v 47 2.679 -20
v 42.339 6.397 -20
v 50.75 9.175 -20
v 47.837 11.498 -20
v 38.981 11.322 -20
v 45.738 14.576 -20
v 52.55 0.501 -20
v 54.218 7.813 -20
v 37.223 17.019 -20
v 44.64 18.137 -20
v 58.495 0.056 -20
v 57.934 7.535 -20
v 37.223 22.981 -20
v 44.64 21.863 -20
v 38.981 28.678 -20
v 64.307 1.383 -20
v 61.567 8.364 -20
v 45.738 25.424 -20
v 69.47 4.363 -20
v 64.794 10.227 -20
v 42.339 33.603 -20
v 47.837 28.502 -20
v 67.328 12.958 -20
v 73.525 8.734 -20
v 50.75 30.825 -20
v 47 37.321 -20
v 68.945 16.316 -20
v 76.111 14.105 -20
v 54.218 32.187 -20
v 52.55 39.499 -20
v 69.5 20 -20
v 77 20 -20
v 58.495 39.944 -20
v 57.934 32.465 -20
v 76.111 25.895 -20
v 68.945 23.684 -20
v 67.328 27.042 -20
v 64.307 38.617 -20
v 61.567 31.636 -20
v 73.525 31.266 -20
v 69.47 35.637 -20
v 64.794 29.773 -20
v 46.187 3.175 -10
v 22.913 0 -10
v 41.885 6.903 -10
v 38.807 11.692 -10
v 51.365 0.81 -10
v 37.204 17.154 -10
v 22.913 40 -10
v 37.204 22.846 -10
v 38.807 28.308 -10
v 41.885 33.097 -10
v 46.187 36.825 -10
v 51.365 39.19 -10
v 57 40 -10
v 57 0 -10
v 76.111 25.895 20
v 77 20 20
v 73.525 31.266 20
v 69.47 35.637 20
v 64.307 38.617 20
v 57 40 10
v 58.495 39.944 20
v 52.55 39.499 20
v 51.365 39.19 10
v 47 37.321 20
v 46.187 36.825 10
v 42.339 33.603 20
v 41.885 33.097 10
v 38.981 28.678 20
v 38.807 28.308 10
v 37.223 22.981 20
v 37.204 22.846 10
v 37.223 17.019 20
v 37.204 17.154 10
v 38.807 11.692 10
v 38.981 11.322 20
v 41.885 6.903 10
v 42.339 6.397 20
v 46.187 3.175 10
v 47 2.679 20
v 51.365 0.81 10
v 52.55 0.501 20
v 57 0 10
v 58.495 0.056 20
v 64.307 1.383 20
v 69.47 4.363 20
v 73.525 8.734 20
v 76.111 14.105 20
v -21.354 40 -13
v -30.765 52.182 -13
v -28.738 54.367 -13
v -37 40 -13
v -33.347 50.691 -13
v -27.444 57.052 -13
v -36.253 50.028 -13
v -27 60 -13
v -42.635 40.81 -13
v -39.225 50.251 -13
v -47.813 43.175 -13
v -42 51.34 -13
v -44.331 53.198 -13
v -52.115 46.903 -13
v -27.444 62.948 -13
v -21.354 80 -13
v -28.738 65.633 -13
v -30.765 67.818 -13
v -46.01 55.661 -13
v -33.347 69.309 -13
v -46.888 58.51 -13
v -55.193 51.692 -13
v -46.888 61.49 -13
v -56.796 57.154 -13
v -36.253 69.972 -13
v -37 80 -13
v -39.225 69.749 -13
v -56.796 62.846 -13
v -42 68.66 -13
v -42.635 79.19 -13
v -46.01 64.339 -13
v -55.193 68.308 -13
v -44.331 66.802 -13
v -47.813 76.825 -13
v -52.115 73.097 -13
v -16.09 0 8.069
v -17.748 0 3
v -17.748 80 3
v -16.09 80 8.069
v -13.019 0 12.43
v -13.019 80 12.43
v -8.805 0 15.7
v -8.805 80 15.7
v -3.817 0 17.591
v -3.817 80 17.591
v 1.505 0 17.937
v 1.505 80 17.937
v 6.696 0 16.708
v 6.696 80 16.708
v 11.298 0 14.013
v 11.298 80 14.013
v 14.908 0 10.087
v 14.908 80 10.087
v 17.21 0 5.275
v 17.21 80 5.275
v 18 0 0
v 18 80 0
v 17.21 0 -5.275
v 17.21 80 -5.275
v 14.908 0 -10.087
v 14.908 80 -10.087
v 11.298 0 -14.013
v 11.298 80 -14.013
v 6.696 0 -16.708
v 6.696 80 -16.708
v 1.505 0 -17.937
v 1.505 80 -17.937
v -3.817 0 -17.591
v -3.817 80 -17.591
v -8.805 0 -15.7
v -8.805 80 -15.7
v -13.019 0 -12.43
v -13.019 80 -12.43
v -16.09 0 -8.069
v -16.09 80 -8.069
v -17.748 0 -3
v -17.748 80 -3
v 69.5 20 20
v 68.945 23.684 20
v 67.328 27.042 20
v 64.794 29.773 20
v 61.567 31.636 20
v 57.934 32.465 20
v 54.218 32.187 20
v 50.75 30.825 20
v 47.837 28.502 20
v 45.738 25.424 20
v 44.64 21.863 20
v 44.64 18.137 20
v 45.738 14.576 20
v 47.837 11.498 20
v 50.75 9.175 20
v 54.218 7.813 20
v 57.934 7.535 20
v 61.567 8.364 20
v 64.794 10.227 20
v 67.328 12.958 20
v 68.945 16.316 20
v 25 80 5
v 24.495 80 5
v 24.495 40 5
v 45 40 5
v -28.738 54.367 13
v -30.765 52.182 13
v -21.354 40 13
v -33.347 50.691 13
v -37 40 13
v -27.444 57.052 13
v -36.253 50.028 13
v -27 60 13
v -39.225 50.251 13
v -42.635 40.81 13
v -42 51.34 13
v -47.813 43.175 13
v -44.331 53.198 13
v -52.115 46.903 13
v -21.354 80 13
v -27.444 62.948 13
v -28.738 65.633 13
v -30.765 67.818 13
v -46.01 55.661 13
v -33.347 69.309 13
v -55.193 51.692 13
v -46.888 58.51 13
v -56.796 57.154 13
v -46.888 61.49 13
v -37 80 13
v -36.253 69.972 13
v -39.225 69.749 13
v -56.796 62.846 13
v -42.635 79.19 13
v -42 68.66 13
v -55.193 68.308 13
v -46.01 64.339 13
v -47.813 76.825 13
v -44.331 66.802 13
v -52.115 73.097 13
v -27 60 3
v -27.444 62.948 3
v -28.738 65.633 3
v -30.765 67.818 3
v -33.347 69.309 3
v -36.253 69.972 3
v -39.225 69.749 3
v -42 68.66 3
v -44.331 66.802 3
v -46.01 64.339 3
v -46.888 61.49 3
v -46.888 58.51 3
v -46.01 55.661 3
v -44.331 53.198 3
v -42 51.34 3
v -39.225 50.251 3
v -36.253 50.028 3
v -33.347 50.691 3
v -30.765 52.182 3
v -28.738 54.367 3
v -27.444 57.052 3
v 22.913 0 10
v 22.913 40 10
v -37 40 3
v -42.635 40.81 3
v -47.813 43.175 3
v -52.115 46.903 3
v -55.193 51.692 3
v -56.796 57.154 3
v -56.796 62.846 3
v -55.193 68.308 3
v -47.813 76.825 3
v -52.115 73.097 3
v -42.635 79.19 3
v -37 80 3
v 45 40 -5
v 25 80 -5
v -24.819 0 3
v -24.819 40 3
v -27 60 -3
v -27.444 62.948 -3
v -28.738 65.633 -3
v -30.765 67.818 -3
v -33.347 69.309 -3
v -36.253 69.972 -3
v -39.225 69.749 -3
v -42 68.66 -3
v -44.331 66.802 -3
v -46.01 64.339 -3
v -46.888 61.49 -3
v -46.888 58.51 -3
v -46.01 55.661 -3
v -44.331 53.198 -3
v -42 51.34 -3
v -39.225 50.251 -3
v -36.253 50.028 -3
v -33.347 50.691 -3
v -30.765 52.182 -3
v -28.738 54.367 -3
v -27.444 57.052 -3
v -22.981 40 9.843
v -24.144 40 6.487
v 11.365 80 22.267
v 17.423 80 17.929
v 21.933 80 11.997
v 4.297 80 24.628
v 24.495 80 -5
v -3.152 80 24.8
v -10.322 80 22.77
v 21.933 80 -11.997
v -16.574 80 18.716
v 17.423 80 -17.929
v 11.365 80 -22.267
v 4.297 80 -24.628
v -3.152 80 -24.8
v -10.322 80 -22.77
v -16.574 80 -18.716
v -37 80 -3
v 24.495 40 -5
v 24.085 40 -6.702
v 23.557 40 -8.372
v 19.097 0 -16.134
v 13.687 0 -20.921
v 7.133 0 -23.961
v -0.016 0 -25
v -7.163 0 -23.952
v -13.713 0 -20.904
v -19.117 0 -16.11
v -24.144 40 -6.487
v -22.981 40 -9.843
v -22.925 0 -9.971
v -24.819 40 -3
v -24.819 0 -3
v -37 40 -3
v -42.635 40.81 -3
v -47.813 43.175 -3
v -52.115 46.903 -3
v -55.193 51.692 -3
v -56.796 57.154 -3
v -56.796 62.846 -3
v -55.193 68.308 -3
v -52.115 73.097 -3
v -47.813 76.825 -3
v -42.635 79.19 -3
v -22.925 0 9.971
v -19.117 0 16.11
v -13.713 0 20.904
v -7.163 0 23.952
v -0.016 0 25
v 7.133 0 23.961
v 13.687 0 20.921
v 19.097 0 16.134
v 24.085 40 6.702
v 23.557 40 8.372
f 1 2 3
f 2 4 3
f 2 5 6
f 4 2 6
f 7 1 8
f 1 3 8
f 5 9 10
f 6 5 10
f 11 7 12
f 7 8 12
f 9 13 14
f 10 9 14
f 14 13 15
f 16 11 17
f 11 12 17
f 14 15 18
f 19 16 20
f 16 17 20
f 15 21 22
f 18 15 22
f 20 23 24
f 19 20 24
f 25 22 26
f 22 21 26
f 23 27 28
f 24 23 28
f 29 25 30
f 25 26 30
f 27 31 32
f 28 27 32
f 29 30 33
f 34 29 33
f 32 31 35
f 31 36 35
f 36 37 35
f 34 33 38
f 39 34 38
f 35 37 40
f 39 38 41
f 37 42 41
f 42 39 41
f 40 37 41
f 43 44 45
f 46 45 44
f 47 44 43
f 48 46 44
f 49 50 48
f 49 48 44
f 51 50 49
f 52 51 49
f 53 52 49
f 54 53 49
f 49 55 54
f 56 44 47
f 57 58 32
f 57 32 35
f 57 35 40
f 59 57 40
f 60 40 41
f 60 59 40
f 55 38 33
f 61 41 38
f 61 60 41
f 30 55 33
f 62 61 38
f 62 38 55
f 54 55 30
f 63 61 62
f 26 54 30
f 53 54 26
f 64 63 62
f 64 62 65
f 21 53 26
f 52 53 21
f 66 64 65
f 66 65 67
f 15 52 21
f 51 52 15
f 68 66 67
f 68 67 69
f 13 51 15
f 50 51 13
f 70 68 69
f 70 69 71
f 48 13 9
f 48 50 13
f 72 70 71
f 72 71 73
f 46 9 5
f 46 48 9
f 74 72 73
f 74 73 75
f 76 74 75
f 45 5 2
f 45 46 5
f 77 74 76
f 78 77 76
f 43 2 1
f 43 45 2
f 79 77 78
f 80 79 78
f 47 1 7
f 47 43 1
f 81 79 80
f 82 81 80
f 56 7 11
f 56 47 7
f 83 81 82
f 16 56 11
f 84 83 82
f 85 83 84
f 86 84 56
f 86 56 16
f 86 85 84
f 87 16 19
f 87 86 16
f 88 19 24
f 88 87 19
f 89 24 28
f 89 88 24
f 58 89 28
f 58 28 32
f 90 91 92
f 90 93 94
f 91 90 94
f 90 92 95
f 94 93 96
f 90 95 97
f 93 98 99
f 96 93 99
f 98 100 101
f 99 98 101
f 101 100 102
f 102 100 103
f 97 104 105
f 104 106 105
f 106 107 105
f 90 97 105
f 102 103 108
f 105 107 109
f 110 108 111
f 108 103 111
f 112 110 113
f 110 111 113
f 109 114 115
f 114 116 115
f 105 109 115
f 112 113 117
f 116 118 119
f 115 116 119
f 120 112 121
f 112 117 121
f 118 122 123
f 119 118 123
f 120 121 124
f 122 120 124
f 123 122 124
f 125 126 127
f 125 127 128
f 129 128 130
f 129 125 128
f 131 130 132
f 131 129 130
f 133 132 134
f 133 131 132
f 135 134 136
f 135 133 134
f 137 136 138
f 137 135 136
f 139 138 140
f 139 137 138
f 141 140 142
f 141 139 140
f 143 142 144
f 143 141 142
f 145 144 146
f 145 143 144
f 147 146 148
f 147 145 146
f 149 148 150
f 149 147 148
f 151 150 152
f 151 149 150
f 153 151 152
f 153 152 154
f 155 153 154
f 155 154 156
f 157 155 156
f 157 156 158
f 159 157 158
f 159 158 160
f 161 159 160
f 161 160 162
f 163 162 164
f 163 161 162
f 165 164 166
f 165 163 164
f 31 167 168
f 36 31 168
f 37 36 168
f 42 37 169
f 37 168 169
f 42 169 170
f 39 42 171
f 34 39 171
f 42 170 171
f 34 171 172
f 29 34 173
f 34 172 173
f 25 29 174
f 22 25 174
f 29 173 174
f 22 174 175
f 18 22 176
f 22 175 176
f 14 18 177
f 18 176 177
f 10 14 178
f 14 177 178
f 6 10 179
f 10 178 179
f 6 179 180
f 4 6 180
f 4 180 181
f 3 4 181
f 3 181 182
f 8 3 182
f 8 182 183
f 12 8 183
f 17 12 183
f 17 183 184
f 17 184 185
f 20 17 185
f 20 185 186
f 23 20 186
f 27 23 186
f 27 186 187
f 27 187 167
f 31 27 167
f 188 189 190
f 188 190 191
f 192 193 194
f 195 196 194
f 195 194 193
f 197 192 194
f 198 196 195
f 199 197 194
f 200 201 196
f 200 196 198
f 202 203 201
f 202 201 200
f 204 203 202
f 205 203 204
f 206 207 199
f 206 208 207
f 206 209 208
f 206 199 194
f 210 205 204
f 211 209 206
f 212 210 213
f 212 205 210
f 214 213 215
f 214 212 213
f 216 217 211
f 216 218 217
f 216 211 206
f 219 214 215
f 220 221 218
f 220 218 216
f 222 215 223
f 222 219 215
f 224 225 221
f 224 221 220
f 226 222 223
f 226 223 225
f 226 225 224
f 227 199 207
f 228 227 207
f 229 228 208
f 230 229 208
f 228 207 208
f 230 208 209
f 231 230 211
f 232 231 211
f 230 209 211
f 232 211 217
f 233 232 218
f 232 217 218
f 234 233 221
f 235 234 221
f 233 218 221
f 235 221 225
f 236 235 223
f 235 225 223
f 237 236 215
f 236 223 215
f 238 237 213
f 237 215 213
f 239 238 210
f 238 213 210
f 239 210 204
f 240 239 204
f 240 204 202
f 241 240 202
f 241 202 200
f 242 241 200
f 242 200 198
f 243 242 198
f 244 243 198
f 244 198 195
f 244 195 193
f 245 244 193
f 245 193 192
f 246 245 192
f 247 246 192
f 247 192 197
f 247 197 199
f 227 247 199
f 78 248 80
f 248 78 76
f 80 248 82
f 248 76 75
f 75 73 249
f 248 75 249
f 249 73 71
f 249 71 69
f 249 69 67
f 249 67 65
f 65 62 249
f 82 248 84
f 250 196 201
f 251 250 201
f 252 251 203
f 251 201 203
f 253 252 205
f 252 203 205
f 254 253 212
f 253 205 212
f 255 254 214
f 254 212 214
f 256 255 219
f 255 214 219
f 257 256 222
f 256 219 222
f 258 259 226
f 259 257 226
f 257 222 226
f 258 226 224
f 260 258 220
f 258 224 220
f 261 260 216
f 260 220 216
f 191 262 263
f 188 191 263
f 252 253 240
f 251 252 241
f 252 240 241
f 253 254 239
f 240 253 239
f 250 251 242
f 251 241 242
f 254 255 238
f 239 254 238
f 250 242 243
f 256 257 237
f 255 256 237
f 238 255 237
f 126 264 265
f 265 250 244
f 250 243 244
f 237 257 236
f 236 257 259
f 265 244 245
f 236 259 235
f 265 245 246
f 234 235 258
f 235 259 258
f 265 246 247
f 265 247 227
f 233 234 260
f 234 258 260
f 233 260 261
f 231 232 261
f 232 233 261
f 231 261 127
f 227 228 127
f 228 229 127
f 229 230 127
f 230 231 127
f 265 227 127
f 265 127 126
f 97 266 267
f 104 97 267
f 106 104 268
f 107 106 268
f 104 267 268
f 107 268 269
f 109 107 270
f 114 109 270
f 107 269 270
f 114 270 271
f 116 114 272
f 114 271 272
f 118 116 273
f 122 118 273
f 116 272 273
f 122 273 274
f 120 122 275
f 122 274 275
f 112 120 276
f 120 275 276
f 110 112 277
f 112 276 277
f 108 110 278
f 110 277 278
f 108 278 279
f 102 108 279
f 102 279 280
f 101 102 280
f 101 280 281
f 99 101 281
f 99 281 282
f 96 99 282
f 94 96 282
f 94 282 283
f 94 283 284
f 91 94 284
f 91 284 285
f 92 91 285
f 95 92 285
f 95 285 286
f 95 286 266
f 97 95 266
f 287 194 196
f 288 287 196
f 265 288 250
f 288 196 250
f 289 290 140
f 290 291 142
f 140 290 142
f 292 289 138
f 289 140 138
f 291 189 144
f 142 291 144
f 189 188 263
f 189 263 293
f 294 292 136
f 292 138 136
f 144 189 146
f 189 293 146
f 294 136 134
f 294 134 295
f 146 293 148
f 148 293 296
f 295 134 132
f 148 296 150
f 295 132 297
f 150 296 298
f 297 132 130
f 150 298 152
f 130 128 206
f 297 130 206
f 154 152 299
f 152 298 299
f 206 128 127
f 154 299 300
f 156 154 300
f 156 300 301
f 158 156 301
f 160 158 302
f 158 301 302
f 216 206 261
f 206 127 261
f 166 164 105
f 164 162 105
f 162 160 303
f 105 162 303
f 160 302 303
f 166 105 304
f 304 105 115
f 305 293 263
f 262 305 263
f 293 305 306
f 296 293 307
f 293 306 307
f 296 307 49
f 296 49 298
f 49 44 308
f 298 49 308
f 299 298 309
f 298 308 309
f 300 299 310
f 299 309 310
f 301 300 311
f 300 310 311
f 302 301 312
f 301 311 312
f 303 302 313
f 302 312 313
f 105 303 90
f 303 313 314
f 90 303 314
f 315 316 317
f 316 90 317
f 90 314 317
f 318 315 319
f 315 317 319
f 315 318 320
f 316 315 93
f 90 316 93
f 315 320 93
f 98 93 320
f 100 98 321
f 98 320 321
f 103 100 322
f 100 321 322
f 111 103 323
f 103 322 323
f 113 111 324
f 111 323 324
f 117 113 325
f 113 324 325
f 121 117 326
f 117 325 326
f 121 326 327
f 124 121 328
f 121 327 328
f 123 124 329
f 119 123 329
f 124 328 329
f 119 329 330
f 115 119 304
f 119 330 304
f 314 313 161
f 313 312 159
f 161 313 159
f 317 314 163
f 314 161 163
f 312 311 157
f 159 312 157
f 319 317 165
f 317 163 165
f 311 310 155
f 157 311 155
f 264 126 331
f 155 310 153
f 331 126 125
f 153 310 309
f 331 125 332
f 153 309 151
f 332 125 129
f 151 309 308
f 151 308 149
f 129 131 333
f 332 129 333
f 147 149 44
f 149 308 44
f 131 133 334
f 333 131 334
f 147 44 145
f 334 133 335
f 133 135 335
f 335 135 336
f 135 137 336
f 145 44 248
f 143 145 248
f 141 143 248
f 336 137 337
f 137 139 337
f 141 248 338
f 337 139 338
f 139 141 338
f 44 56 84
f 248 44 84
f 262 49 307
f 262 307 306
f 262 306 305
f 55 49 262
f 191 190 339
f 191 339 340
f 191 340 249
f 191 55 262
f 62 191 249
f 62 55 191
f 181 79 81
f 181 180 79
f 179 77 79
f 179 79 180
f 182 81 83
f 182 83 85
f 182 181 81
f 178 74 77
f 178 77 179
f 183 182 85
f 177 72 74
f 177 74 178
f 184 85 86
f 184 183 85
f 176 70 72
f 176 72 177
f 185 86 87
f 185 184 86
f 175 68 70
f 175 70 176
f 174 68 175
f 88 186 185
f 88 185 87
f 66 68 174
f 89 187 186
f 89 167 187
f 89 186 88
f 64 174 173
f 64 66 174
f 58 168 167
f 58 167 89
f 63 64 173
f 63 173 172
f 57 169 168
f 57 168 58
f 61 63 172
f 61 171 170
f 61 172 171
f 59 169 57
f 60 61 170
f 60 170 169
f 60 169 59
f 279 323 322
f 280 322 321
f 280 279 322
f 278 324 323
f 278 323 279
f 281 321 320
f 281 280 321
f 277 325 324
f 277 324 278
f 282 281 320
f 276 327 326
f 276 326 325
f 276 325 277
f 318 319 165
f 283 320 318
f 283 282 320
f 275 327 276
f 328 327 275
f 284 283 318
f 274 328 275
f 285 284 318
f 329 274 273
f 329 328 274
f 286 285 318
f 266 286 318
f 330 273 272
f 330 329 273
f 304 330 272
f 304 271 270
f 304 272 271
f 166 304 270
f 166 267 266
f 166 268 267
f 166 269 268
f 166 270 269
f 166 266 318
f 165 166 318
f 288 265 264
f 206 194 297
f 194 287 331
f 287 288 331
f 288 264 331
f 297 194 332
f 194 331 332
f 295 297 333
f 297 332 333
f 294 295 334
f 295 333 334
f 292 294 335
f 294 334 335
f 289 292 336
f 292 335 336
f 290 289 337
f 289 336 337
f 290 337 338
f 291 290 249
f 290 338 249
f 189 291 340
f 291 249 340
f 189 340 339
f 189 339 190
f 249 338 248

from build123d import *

# Parameters (mm, degrees)
SKETCH1_R                = 25
SKETCH1_R_2              = 18
BOSS_EXTRUDE1_DEPTH      = 80
SKETCH2_W                = 12
SKETCH2_H                = 40
BOSS_EXTRUDE2_DEPTH      = 13
BOSS_EXTRUDE3_REACH      = 99.596
BOSS_EXTRUDE3_END_RADIUS = 25
SKETCH4_W                = 26
SKETCH4_H                = 40
SKETCH5_R                = 10
CUT_EXTRUDE1_DEPTH       = 106.32331176
BOSS_EXTRUDE4_DEPTH      = 10
SKETCH6_3_R              = 20
BOSS_EXTRUDE5_DEPTH      = 20
BOSS_EXTRUDE6_REACH      = 119.256
BOSS_EXTRUDE6_END_RADIUS = 25
SKETCH7_W                = 20
SKETCH7_H                = 40
SKETCH8_R                = 12.5
CUT_EXTRUDE2_DEPTH       = 120.808180021
RIB2_START               = -5
RIB2_DEPTH               = 10
SKETCH10_W               = 67.322464705
SKETCH10_H               = 6
CUT_EXTRUDE3_DEPTH       = 114.815640401


with BuildPart() as part:
    # Sketch1 → Boss-Extrude1 (new body)
    with BuildSketch(Plane(origin=(0, 0, 0), x_dir=(1, 0, 0), z_dir=(0, 1, 0))):
        with Locations(Location((0, 0, 0), (0, 0, 270))):
            Circle(SKETCH1_R)
        with Locations(Location((0, 0, 0), (0, 0, 270))):
            Circle(SKETCH1_R_2, mode=Mode.SUBTRACT)
    extrude(amount=BOSS_EXTRUDE1_DEPTH)



with BuildPart() as body_2:
    # Sketch2 → Boss-Extrude2 (new, symmetric)
    with BuildSketch(Plane.XY):
        with BuildLine():
            Line((-37, 80), (-37, 40))
            ThreePointArc((-37, 40), (-57, 60), (-37, 80))
        make_face()
        with Locations((-31, 60)):
            Rectangle(SKETCH2_W, SKETCH2_H)
    extrude(amount=BOSS_EXTRUDE2_DEPTH, both=True)


with BuildPart() as part_1:
    add(part.part)

    add(body_2.part)  # Boss-Extrude3 merges body 2
    # Boss-Extrude3: up to this cylinder (the profile starts outside it)
    boss_extrude3_end = Plane(origin=(0, 60, 0), z_dir=(0, -1, 0)) * Cylinder(BOSS_EXTRUDE3_END_RADIUS, 250.192, mode=Mode.PRIVATE)
    # Sketch4 → Boss-Extrude3 (add, up to the surface)
    with BuildSketch(Plane(origin=(-25, 0, 0), x_dir=(0, 0, -1), z_dir=(1, 0, 0)), mode=Mode.PRIVATE) as boss_extrude3_sk1:
        with Locations((0, 60)):
            Rectangle(SKETCH4_W, SKETCH4_H)
    boss_extrude3_tool1 = extrude(boss_extrude3_sk1.sketch, amount=BOSS_EXTRUDE3_REACH, mode=Mode.PRIVATE) - boss_extrude3_end
    add(boss_extrude3_tool1.solids().sort_by_distance((-25, 60, 0))[0])
    add(boss_extrude3_tool1.solids().sort_by_distance((-25, 60, 0))[1])

    # Sketch5 → Cut-Extrude1 (cut, through all)
    with BuildSketch(Plane.XY.offset(13)):
        with Locations((-37, 60)):
            Circle(SKETCH5_R)
    extrude(amount=-CUT_EXTRUDE1_DEPTH, mode=Mode.SUBTRACT)



with BuildPart() as body_2_2:
    # Sketch6 → Boss-Extrude4 (new, symmetric)
    with BuildSketch(Plane.XY):
        with BuildLine():
            Line((25, 40), (25, 0))
            Line((25, 0), (57, 0))
            ThreePointArc((57, 0), (37, 20), (57, 40))
            Line((57, 40), (25, 40))
        make_face()
    extrude(amount=BOSS_EXTRUDE4_DEPTH, both=True)

    # Sketch6<3> → Boss-Extrude5 (add, symmetric)
    with BuildSketch(Plane.XY):
        with Locations((57, 20)):
            Circle(SKETCH6_3_R)
    extrude(amount=BOSS_EXTRUDE5_DEPTH, both=True)


with BuildPart() as part_2:
    add(part_1.part)

    add(body_2_2.part)  # Boss-Extrude6 merges body 2 2
    # Boss-Extrude6: up to this cylinder (the profile starts outside it)
    boss_extrude6_end = Plane(origin=(0, 20, 0), z_dir=(0, -1, 0)) * Cylinder(BOSS_EXTRUDE6_END_RADIUS, 289.512, mode=Mode.PRIVATE)
    # Sketch7 → Boss-Extrude6 (add, up to the surface)
    with BuildSketch(Plane.ZY.offset(-25), mode=Mode.PRIVATE) as boss_extrude6_sk1:
        with Locations((0, 20)):
            Rectangle(SKETCH7_W, SKETCH7_H)
    boss_extrude6_tool1 = extrude(boss_extrude6_sk1.sketch, amount=BOSS_EXTRUDE6_REACH, mode=Mode.PRIVATE) - boss_extrude6_end
    add(boss_extrude6_tool1.solids().sort_by_distance((25, 20, 0))[0])
    add(boss_extrude6_tool1.solids().sort_by_distance((25, 20, 0))[1])

    # Sketch8 → Cut-Extrude2 (cut, through all)
    with BuildSketch(Plane.XY.offset(20)):
        with Locations((57, 20)):
            Circle(SKETCH8_R)
    extrude(amount=-CUT_EXTRUDE2_DEPTH, mode=Mode.SUBTRACT)

    # Rib2: read off the stored shape, not the designer's step
    # Rib2 outline → Rib2 (add)
    with BuildSketch(Plane.XY.offset(RIB2_START)):
        Polygon((25, 80), (24.494897428, 80), (24.494897428, 40), (45, 40), align=None)
    extrude(amount=RIB2_DEPTH)

    # Sketch10 → Cut-Extrude3 (cut, through all)
    with BuildSketch(Plane(origin=(0, 80, 0), x_dir=(1, 0, 0), z_dir=(0, 1, 0))):
        with Locations((-36.448129058, 0)):
            Rectangle(SKETCH10_W, SKETCH10_H)
    extrude(amount=-CUT_EXTRUDE3_DEPTH, mode=Mode.SUBTRACT)


solid = part_2.part
